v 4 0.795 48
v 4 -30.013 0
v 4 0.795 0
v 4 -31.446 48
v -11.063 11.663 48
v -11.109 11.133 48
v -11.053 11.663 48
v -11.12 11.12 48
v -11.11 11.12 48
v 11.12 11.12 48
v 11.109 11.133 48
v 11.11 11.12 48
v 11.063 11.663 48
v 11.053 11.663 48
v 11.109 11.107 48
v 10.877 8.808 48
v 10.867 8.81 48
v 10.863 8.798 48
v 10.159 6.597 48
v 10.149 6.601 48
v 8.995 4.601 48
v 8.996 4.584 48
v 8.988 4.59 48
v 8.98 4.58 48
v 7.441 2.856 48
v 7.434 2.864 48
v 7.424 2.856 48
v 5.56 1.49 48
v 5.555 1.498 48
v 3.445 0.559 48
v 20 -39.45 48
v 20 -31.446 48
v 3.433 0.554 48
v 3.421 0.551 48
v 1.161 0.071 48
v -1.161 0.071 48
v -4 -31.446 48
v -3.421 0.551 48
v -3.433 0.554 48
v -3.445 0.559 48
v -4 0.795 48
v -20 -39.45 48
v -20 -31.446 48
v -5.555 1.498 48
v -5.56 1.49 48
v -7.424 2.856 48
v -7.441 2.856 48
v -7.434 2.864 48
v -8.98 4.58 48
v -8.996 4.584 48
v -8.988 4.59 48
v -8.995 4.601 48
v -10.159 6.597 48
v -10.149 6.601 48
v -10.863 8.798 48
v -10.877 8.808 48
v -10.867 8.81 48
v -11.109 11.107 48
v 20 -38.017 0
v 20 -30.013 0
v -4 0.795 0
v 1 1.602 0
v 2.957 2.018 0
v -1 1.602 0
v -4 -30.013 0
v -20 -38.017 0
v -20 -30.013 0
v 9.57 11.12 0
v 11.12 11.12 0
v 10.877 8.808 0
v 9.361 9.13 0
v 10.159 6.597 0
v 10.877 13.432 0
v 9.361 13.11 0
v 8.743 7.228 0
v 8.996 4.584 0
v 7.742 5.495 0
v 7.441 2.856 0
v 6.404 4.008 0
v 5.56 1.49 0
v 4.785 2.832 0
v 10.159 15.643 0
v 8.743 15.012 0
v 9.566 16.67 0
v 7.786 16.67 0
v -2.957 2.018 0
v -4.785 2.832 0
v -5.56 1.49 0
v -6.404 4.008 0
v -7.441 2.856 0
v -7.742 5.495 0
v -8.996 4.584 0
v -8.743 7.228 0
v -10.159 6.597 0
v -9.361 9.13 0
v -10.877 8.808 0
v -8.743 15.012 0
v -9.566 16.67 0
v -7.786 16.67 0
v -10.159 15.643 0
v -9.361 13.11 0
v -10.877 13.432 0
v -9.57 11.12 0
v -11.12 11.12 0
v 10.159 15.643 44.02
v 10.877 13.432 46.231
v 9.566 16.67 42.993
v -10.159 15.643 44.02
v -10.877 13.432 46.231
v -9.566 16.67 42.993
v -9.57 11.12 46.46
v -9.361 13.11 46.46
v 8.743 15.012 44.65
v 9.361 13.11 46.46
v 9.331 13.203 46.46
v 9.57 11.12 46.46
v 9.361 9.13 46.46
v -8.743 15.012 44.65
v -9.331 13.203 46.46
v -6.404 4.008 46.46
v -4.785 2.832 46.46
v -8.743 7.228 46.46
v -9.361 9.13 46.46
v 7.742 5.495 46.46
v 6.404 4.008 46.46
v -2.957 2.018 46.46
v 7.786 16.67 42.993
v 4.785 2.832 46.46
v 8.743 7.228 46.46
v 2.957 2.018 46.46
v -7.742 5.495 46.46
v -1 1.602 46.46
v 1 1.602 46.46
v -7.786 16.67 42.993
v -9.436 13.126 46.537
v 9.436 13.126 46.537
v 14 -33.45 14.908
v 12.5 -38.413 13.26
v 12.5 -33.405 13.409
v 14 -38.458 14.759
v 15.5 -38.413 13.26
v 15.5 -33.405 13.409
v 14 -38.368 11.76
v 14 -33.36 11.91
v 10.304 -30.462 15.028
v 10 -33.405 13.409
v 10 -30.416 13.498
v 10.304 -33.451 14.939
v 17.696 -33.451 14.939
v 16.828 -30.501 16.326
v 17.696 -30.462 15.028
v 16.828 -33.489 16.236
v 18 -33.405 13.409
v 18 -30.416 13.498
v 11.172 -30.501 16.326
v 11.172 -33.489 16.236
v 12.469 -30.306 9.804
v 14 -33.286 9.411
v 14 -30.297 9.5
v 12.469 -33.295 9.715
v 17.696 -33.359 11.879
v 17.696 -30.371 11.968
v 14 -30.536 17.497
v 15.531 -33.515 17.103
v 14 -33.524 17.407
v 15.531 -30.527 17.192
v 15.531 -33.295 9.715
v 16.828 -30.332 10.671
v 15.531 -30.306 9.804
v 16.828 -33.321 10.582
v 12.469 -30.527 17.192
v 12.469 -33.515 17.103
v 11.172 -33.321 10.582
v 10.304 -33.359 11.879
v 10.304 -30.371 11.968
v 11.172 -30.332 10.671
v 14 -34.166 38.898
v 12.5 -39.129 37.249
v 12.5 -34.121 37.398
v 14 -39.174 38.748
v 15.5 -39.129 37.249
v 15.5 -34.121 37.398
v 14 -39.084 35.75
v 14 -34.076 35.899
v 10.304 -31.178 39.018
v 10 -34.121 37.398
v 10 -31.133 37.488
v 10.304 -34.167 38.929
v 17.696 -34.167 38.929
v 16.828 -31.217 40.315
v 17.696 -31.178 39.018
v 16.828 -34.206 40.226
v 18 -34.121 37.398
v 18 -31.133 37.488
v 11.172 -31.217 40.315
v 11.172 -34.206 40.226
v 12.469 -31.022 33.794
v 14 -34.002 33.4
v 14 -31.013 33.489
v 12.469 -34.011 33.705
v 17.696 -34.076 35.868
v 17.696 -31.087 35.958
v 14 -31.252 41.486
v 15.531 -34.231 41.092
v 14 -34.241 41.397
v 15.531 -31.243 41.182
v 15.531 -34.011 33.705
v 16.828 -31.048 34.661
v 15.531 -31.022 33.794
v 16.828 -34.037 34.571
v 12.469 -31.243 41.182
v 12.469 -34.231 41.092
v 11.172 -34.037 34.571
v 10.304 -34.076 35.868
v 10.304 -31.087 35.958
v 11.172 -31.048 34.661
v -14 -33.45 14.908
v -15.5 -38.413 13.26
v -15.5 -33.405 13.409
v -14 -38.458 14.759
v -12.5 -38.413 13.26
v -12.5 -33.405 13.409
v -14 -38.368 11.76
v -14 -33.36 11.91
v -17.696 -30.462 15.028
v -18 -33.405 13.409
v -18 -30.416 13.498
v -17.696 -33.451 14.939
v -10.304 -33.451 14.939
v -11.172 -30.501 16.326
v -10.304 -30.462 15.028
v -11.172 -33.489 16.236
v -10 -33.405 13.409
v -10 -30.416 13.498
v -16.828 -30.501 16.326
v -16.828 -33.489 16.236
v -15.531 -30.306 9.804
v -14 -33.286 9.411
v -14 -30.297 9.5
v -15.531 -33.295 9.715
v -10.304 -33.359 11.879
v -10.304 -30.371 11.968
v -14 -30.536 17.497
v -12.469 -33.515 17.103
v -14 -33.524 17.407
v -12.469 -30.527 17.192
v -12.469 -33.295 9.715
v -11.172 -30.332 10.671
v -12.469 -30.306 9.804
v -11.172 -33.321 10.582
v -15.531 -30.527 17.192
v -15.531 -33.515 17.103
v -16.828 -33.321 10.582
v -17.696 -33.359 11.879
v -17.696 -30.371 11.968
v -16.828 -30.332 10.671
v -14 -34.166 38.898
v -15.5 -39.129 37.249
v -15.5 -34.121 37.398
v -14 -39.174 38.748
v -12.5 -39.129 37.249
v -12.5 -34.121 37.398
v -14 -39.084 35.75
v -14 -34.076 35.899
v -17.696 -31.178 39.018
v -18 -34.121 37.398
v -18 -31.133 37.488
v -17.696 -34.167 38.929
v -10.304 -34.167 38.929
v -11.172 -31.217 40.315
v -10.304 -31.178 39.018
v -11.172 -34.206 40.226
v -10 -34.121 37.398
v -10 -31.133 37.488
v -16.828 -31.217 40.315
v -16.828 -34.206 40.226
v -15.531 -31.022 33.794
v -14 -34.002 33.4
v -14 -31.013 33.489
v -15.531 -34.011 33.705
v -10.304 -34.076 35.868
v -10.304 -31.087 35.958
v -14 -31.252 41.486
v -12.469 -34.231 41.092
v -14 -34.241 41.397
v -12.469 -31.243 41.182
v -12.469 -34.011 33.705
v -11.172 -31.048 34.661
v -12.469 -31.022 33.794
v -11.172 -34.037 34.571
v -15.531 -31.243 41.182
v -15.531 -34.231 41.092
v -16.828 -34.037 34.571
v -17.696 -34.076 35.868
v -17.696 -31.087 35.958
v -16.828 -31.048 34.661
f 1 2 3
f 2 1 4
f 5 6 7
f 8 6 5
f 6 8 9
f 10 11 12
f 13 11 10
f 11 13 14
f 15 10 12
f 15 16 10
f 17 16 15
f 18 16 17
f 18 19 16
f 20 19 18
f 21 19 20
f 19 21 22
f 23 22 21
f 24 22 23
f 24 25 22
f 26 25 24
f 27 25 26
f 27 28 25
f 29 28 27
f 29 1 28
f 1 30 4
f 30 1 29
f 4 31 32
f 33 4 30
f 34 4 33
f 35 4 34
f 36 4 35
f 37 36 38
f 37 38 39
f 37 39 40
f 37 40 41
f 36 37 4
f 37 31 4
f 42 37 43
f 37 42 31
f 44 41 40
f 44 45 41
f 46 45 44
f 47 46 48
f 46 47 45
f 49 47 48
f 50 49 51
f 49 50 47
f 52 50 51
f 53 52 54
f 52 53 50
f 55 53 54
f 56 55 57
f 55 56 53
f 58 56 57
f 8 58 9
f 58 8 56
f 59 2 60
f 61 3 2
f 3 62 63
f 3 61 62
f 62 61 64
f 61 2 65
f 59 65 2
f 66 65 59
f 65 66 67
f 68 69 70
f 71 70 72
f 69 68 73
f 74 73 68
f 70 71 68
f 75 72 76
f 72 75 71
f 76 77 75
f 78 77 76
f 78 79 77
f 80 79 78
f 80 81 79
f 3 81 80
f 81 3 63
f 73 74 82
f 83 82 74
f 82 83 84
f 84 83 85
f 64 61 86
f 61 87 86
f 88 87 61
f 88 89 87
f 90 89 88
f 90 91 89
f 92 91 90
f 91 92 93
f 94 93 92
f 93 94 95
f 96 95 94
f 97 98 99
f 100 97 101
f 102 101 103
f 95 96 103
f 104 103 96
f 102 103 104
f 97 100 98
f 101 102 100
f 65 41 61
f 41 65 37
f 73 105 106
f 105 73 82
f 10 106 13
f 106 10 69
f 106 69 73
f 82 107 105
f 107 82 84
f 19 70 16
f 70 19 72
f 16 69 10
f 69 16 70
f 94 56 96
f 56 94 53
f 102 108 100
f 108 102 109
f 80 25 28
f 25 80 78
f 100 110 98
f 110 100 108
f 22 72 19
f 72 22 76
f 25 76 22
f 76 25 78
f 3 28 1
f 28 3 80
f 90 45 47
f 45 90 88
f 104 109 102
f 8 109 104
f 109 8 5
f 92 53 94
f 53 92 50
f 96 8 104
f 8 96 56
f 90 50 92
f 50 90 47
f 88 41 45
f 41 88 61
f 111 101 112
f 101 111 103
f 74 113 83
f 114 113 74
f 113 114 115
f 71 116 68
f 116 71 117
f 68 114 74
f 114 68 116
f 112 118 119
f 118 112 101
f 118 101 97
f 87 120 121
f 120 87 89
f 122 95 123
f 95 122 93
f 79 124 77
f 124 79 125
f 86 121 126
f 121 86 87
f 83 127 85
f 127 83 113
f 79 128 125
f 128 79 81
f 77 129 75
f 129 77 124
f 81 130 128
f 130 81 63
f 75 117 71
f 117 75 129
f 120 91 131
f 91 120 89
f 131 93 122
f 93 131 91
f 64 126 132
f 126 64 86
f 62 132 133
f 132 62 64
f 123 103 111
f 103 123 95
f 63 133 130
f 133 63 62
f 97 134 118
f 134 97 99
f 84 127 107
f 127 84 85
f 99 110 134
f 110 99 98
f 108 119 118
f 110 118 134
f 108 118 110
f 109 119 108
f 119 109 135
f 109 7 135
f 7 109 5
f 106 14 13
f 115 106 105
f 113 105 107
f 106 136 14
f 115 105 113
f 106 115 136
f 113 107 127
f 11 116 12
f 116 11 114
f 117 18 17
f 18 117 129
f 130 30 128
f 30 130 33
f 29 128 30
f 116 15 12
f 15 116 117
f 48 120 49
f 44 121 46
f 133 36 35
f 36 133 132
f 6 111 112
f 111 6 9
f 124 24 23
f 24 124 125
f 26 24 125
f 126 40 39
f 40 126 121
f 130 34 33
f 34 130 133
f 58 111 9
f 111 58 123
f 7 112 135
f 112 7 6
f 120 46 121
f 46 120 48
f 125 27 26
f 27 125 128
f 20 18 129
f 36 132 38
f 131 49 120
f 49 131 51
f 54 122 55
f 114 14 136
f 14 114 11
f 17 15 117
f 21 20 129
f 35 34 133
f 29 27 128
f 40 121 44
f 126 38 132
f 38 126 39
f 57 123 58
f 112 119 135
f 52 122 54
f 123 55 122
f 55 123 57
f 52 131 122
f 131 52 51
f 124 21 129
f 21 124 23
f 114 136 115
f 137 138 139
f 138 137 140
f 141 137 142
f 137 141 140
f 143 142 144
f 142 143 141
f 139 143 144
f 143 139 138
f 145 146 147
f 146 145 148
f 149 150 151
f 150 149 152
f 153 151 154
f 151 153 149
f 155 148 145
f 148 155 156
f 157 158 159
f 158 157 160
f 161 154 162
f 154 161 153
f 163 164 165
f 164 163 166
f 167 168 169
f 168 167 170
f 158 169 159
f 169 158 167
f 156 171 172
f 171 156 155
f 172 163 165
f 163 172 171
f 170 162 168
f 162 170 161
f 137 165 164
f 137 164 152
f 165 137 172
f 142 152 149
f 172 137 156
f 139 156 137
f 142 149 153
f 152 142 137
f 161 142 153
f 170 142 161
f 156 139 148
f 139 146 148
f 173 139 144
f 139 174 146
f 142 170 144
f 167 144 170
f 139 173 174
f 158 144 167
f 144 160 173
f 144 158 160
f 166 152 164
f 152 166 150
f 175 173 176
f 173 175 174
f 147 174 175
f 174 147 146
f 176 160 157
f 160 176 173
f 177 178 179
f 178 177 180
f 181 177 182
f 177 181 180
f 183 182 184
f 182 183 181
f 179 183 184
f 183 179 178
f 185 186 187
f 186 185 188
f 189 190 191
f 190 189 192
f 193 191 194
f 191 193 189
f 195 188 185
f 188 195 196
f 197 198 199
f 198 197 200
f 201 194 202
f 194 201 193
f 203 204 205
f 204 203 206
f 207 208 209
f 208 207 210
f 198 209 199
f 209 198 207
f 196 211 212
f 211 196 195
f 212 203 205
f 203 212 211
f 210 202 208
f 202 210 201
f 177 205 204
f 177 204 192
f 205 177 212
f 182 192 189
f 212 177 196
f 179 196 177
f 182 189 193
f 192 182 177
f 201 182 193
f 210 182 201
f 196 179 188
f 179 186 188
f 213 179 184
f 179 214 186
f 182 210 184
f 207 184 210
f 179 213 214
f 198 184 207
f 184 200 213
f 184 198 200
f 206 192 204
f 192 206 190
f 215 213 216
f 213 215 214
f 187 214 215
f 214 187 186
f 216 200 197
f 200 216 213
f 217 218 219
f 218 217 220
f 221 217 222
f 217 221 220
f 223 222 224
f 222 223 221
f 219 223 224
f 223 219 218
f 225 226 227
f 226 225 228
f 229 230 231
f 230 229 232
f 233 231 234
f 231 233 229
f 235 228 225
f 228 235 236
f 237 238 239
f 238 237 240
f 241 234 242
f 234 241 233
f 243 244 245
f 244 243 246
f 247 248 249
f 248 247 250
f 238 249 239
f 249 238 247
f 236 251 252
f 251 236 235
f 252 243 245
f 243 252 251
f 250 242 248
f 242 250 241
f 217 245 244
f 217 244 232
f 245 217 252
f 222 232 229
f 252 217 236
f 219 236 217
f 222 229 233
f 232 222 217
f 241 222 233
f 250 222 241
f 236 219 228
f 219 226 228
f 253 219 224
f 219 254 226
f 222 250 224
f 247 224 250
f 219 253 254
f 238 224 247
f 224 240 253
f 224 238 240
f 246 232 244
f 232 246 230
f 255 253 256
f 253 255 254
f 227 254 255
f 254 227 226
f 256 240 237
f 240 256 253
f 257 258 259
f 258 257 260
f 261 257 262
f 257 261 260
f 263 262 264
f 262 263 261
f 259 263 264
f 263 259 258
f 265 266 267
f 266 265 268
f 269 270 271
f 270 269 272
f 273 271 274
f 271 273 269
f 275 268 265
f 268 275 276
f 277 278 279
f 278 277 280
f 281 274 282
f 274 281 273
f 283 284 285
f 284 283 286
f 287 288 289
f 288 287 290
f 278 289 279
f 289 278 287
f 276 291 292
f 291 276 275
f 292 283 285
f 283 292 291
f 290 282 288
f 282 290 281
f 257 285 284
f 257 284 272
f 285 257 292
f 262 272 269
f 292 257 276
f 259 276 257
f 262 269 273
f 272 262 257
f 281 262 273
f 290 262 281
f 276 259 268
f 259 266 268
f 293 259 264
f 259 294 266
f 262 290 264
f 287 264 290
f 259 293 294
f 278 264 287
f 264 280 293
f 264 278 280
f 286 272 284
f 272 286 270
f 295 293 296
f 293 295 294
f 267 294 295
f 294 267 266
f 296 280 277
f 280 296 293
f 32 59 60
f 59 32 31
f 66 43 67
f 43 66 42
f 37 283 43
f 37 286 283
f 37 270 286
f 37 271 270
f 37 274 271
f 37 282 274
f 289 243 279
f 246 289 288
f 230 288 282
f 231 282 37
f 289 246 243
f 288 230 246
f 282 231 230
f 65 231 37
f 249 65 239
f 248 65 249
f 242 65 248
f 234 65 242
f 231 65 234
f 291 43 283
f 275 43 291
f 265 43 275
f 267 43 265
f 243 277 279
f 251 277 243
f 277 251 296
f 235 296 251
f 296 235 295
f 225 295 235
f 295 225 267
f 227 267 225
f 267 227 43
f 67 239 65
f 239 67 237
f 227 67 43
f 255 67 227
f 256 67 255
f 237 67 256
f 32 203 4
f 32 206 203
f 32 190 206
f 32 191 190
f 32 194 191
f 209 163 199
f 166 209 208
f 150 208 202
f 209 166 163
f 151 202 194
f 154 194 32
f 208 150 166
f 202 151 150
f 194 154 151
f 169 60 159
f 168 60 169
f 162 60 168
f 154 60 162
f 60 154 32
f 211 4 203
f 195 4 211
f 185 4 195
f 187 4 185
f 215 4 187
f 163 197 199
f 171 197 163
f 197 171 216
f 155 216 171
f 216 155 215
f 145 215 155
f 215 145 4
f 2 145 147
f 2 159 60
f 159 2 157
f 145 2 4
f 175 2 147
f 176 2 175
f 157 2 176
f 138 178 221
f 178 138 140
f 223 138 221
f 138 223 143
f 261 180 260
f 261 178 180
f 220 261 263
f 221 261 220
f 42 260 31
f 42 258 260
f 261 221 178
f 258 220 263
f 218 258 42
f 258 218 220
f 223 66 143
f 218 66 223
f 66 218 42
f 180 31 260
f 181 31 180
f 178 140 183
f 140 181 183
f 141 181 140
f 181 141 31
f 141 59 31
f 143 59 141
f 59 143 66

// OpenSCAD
clipAngle = 1.71;
clipLength = 48; 
poleDiameter = 19.14;

webThickness = 1.55;
clipBottomStickout = 30;
clipAttachmentThickness = 8;

screwHoleSize = 3;
screwHoleCountersinkDiameter = 8;
screwHoleCountersinkDepth = 3;

flangeWidth = 40;
flangeThickness = 8;

bottomScrewsHeightFactor = .3; 
topScrewsHeightFactor = 0.8;

nudge = 0.01;

module clip() {
    render(convexity=5)
    translate([0,poleDiameter/2+webThickness,])
    difference() {
        union() {
            translate([-clipAttachmentThickness/2,-clipBottomStickout-poleDiameter/2,0])
            cube([clipAttachmentThickness,clipBottomStickout,clipLength]);
                cylinder(h=clipLength,d=poleDiameter+2*webThickness);
        }
        translate([0,poleDiameter*.85,clipLength]) rotate([-45,0,0])
        cube(center=true,poleDiameter+2*webThickness);
translate([0,0,clipLength-webThickness+nudge]) cylinder(h=webThickness,d1=poleDiameter,d2=poleDiameter+2*webThickness);
        translate([0,0,-nudge]) {
            cylinder(h=clipLength+2*nudge,d=poleDiameter);
            translate([0,1.5*(webThickness+poleDiameter/2),0]) linear_extrude(height=clipLength+2*nudge) square(center=true, poleDiameter+2*webThickness+2*nudge);
        }
    }
}

module screwHole() {
rotate([90,0,0])
translate([0,0,-nudge]) {
    cylinder(d=screwHoleSize, $fn=4, h=flangeThickness+2*nudge); 
    cylinder(d=screwHoleCountersinkDiameter, $fn=16, h=screwHoleCountersinkDepth);
    }
}

module wallAttachment() {
    render(convexity=2)
    intersection() {
    translate([-250,-250,0]) cube([500,500,clipLength]);
    rotate([clipAngle,0,0])
    {
    translate([0,-clipBottomStickout-flangeThickness,0]) difference() {
    translate([-flangeWidth/2,0,-clipLength])
        cube([flangeWidth, flangeThickness, 3*clipLength]);
        translate([flangeWidth*.35,clipAttachmentThickness,clipLength*bottomScrewsHeightFactor]) screwHole();
        translate([flangeWidth*.35,clipAttachmentThickness,clipLength*topScrewsHeightFactor]) screwHole();
        translate([-flangeWidth*.35,clipAttachmentThickness,clipLength*bottomScrewsHeightFactor]) screwHole();
        translate([-flangeWidth*.35,clipAttachmentThickness,clipLength*topScrewsHeightFactor]) screwHole();
    }
    translate([-flangeWidth/2,0,-clipLength])
        translate([flangeWidth/2-clipAttachmentThickness/2,-clipBottomStickout,0])
        cube([clipAttachmentThickness,clipBottomStickout,3*clipLength]);
    }
    }
}

clip();
wallAttachment();
